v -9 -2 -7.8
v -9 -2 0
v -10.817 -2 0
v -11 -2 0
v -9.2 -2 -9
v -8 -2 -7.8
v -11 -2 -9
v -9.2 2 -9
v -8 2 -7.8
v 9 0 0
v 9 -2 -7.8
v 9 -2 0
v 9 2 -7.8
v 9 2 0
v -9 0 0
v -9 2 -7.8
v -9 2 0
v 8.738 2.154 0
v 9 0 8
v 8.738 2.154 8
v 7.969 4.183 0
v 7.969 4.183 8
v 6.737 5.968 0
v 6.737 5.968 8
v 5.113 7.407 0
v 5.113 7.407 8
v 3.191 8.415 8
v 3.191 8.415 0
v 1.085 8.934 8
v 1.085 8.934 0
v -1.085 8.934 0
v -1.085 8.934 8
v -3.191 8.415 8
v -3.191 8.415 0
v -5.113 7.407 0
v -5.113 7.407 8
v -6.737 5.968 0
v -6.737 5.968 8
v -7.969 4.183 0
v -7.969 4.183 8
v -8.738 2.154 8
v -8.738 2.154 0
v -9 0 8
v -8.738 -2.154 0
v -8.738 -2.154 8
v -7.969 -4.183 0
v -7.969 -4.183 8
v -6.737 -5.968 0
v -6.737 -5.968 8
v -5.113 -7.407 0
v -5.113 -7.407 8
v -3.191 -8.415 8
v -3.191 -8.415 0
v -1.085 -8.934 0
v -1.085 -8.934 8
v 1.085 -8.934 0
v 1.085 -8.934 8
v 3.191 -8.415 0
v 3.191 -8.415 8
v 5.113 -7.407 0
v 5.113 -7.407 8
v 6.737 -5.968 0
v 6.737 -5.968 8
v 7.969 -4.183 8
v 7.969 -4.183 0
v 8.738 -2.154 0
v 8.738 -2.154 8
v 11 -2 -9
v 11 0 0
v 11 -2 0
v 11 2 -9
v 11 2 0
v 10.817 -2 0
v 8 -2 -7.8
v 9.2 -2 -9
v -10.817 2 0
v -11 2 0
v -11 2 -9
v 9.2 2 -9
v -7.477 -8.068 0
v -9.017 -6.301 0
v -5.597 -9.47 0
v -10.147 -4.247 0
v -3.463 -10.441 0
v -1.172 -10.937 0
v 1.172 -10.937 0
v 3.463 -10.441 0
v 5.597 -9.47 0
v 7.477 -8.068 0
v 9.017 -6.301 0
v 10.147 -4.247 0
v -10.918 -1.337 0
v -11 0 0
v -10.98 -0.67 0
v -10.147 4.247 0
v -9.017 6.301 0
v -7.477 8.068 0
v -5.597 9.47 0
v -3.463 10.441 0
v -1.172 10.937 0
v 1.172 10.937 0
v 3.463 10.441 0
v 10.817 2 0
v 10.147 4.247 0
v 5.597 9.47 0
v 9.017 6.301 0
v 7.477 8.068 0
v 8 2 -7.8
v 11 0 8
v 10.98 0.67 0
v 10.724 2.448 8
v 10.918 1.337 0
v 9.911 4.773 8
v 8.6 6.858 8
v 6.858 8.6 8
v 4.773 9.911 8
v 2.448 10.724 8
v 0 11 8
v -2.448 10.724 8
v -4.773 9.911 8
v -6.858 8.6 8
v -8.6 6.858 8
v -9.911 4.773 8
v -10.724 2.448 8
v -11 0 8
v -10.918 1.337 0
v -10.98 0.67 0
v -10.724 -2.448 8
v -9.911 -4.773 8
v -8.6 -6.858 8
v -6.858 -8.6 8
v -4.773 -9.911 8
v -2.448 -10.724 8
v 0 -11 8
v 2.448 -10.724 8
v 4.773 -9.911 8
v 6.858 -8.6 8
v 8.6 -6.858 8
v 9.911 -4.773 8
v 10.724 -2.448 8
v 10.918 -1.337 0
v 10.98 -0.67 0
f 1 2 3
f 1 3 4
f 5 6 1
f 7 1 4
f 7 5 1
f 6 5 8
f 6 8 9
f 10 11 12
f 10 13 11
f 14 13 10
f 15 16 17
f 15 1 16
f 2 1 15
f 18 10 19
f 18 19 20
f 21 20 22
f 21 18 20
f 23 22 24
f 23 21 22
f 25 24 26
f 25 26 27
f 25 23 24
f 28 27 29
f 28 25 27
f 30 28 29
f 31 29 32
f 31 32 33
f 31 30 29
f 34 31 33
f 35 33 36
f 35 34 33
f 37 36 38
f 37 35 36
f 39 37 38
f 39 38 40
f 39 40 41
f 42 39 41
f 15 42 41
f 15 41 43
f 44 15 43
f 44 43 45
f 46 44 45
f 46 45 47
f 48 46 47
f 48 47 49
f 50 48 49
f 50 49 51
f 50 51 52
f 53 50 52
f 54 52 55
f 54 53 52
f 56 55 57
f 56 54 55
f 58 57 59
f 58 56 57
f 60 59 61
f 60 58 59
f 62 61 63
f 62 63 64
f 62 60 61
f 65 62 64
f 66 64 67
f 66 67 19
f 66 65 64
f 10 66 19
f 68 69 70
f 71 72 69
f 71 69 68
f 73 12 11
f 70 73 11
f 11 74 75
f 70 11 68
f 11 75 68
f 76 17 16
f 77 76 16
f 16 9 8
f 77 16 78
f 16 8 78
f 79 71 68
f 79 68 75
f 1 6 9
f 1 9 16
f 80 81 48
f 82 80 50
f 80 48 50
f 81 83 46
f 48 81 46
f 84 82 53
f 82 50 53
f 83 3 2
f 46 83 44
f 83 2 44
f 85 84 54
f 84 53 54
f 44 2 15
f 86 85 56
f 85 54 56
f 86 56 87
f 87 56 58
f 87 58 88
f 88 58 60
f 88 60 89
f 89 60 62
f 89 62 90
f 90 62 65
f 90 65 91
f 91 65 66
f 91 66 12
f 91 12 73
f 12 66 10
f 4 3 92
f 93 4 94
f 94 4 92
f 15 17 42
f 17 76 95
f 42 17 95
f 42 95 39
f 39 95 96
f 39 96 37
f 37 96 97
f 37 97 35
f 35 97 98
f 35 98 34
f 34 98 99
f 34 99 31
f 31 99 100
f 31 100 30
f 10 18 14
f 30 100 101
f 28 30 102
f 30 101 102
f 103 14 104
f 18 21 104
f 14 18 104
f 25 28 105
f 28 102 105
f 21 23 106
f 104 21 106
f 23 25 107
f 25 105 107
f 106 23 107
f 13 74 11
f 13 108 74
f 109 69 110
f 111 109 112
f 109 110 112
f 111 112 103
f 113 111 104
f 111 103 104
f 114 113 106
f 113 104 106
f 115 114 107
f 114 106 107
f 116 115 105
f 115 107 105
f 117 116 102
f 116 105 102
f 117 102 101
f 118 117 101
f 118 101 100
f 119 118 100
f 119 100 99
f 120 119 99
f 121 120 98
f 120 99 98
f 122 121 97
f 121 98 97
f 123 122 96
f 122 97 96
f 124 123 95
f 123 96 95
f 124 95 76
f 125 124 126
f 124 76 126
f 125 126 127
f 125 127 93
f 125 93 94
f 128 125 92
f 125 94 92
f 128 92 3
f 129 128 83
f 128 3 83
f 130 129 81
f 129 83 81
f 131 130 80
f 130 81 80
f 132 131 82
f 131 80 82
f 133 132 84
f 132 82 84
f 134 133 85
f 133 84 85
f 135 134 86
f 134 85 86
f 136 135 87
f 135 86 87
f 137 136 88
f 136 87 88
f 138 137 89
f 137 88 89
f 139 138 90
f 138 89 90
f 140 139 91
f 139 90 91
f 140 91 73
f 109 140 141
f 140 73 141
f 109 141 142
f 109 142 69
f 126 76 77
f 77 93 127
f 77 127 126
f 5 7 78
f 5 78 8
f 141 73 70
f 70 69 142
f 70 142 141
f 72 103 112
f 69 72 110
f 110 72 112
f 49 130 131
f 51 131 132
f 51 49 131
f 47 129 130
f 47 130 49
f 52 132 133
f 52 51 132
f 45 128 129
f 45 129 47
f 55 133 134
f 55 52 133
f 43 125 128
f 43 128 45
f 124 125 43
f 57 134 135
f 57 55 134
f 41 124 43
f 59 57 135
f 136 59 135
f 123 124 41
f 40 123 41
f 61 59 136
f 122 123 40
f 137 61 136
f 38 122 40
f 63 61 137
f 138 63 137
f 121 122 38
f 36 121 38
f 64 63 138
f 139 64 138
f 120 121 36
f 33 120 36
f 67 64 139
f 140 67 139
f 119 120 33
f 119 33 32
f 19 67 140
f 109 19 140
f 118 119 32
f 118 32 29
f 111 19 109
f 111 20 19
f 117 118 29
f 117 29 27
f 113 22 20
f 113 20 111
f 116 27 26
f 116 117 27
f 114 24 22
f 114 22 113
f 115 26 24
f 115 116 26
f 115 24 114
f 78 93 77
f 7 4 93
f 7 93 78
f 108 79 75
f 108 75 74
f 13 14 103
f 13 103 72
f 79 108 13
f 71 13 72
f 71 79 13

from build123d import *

# Parameters (mm, degrees)
SKETCH1_R           = 11
SKETCH1_R_2         = 9
BOSS_EXTRUDE1_DEPTH = 8
BOSS_EXTRUDE2_DEPTH = 2


with BuildPart() as part:
    # Sketch1 → Boss-Extrude1 (new body)
    with BuildSketch(Plane.XY):
        Circle(SKETCH1_R)
        Circle(SKETCH1_R_2, mode=Mode.SUBTRACT)
    extrude(amount=BOSS_EXTRUDE1_DEPTH)

    # Sketch2 → Boss-Extrude2 (add, symmetric)
    with BuildSketch(Plane(origin=(0, 0, 0), x_dir=(1, 0, 0), z_dir=(0, 1, 0))):
        Polygon((-11, 0), (-11, 9), (-9.2, 9), (-8, 7.8), (-9, 7.8), (-9, 0), align=None)
        Polygon((9, 0), (11, 0), (11, 9), (9.2, 9), (8, 7.8), (9, 7.8), align=None)
    extrude(amount=BOSS_EXTRUDE2_DEPTH, both=True)


solid = part.part
